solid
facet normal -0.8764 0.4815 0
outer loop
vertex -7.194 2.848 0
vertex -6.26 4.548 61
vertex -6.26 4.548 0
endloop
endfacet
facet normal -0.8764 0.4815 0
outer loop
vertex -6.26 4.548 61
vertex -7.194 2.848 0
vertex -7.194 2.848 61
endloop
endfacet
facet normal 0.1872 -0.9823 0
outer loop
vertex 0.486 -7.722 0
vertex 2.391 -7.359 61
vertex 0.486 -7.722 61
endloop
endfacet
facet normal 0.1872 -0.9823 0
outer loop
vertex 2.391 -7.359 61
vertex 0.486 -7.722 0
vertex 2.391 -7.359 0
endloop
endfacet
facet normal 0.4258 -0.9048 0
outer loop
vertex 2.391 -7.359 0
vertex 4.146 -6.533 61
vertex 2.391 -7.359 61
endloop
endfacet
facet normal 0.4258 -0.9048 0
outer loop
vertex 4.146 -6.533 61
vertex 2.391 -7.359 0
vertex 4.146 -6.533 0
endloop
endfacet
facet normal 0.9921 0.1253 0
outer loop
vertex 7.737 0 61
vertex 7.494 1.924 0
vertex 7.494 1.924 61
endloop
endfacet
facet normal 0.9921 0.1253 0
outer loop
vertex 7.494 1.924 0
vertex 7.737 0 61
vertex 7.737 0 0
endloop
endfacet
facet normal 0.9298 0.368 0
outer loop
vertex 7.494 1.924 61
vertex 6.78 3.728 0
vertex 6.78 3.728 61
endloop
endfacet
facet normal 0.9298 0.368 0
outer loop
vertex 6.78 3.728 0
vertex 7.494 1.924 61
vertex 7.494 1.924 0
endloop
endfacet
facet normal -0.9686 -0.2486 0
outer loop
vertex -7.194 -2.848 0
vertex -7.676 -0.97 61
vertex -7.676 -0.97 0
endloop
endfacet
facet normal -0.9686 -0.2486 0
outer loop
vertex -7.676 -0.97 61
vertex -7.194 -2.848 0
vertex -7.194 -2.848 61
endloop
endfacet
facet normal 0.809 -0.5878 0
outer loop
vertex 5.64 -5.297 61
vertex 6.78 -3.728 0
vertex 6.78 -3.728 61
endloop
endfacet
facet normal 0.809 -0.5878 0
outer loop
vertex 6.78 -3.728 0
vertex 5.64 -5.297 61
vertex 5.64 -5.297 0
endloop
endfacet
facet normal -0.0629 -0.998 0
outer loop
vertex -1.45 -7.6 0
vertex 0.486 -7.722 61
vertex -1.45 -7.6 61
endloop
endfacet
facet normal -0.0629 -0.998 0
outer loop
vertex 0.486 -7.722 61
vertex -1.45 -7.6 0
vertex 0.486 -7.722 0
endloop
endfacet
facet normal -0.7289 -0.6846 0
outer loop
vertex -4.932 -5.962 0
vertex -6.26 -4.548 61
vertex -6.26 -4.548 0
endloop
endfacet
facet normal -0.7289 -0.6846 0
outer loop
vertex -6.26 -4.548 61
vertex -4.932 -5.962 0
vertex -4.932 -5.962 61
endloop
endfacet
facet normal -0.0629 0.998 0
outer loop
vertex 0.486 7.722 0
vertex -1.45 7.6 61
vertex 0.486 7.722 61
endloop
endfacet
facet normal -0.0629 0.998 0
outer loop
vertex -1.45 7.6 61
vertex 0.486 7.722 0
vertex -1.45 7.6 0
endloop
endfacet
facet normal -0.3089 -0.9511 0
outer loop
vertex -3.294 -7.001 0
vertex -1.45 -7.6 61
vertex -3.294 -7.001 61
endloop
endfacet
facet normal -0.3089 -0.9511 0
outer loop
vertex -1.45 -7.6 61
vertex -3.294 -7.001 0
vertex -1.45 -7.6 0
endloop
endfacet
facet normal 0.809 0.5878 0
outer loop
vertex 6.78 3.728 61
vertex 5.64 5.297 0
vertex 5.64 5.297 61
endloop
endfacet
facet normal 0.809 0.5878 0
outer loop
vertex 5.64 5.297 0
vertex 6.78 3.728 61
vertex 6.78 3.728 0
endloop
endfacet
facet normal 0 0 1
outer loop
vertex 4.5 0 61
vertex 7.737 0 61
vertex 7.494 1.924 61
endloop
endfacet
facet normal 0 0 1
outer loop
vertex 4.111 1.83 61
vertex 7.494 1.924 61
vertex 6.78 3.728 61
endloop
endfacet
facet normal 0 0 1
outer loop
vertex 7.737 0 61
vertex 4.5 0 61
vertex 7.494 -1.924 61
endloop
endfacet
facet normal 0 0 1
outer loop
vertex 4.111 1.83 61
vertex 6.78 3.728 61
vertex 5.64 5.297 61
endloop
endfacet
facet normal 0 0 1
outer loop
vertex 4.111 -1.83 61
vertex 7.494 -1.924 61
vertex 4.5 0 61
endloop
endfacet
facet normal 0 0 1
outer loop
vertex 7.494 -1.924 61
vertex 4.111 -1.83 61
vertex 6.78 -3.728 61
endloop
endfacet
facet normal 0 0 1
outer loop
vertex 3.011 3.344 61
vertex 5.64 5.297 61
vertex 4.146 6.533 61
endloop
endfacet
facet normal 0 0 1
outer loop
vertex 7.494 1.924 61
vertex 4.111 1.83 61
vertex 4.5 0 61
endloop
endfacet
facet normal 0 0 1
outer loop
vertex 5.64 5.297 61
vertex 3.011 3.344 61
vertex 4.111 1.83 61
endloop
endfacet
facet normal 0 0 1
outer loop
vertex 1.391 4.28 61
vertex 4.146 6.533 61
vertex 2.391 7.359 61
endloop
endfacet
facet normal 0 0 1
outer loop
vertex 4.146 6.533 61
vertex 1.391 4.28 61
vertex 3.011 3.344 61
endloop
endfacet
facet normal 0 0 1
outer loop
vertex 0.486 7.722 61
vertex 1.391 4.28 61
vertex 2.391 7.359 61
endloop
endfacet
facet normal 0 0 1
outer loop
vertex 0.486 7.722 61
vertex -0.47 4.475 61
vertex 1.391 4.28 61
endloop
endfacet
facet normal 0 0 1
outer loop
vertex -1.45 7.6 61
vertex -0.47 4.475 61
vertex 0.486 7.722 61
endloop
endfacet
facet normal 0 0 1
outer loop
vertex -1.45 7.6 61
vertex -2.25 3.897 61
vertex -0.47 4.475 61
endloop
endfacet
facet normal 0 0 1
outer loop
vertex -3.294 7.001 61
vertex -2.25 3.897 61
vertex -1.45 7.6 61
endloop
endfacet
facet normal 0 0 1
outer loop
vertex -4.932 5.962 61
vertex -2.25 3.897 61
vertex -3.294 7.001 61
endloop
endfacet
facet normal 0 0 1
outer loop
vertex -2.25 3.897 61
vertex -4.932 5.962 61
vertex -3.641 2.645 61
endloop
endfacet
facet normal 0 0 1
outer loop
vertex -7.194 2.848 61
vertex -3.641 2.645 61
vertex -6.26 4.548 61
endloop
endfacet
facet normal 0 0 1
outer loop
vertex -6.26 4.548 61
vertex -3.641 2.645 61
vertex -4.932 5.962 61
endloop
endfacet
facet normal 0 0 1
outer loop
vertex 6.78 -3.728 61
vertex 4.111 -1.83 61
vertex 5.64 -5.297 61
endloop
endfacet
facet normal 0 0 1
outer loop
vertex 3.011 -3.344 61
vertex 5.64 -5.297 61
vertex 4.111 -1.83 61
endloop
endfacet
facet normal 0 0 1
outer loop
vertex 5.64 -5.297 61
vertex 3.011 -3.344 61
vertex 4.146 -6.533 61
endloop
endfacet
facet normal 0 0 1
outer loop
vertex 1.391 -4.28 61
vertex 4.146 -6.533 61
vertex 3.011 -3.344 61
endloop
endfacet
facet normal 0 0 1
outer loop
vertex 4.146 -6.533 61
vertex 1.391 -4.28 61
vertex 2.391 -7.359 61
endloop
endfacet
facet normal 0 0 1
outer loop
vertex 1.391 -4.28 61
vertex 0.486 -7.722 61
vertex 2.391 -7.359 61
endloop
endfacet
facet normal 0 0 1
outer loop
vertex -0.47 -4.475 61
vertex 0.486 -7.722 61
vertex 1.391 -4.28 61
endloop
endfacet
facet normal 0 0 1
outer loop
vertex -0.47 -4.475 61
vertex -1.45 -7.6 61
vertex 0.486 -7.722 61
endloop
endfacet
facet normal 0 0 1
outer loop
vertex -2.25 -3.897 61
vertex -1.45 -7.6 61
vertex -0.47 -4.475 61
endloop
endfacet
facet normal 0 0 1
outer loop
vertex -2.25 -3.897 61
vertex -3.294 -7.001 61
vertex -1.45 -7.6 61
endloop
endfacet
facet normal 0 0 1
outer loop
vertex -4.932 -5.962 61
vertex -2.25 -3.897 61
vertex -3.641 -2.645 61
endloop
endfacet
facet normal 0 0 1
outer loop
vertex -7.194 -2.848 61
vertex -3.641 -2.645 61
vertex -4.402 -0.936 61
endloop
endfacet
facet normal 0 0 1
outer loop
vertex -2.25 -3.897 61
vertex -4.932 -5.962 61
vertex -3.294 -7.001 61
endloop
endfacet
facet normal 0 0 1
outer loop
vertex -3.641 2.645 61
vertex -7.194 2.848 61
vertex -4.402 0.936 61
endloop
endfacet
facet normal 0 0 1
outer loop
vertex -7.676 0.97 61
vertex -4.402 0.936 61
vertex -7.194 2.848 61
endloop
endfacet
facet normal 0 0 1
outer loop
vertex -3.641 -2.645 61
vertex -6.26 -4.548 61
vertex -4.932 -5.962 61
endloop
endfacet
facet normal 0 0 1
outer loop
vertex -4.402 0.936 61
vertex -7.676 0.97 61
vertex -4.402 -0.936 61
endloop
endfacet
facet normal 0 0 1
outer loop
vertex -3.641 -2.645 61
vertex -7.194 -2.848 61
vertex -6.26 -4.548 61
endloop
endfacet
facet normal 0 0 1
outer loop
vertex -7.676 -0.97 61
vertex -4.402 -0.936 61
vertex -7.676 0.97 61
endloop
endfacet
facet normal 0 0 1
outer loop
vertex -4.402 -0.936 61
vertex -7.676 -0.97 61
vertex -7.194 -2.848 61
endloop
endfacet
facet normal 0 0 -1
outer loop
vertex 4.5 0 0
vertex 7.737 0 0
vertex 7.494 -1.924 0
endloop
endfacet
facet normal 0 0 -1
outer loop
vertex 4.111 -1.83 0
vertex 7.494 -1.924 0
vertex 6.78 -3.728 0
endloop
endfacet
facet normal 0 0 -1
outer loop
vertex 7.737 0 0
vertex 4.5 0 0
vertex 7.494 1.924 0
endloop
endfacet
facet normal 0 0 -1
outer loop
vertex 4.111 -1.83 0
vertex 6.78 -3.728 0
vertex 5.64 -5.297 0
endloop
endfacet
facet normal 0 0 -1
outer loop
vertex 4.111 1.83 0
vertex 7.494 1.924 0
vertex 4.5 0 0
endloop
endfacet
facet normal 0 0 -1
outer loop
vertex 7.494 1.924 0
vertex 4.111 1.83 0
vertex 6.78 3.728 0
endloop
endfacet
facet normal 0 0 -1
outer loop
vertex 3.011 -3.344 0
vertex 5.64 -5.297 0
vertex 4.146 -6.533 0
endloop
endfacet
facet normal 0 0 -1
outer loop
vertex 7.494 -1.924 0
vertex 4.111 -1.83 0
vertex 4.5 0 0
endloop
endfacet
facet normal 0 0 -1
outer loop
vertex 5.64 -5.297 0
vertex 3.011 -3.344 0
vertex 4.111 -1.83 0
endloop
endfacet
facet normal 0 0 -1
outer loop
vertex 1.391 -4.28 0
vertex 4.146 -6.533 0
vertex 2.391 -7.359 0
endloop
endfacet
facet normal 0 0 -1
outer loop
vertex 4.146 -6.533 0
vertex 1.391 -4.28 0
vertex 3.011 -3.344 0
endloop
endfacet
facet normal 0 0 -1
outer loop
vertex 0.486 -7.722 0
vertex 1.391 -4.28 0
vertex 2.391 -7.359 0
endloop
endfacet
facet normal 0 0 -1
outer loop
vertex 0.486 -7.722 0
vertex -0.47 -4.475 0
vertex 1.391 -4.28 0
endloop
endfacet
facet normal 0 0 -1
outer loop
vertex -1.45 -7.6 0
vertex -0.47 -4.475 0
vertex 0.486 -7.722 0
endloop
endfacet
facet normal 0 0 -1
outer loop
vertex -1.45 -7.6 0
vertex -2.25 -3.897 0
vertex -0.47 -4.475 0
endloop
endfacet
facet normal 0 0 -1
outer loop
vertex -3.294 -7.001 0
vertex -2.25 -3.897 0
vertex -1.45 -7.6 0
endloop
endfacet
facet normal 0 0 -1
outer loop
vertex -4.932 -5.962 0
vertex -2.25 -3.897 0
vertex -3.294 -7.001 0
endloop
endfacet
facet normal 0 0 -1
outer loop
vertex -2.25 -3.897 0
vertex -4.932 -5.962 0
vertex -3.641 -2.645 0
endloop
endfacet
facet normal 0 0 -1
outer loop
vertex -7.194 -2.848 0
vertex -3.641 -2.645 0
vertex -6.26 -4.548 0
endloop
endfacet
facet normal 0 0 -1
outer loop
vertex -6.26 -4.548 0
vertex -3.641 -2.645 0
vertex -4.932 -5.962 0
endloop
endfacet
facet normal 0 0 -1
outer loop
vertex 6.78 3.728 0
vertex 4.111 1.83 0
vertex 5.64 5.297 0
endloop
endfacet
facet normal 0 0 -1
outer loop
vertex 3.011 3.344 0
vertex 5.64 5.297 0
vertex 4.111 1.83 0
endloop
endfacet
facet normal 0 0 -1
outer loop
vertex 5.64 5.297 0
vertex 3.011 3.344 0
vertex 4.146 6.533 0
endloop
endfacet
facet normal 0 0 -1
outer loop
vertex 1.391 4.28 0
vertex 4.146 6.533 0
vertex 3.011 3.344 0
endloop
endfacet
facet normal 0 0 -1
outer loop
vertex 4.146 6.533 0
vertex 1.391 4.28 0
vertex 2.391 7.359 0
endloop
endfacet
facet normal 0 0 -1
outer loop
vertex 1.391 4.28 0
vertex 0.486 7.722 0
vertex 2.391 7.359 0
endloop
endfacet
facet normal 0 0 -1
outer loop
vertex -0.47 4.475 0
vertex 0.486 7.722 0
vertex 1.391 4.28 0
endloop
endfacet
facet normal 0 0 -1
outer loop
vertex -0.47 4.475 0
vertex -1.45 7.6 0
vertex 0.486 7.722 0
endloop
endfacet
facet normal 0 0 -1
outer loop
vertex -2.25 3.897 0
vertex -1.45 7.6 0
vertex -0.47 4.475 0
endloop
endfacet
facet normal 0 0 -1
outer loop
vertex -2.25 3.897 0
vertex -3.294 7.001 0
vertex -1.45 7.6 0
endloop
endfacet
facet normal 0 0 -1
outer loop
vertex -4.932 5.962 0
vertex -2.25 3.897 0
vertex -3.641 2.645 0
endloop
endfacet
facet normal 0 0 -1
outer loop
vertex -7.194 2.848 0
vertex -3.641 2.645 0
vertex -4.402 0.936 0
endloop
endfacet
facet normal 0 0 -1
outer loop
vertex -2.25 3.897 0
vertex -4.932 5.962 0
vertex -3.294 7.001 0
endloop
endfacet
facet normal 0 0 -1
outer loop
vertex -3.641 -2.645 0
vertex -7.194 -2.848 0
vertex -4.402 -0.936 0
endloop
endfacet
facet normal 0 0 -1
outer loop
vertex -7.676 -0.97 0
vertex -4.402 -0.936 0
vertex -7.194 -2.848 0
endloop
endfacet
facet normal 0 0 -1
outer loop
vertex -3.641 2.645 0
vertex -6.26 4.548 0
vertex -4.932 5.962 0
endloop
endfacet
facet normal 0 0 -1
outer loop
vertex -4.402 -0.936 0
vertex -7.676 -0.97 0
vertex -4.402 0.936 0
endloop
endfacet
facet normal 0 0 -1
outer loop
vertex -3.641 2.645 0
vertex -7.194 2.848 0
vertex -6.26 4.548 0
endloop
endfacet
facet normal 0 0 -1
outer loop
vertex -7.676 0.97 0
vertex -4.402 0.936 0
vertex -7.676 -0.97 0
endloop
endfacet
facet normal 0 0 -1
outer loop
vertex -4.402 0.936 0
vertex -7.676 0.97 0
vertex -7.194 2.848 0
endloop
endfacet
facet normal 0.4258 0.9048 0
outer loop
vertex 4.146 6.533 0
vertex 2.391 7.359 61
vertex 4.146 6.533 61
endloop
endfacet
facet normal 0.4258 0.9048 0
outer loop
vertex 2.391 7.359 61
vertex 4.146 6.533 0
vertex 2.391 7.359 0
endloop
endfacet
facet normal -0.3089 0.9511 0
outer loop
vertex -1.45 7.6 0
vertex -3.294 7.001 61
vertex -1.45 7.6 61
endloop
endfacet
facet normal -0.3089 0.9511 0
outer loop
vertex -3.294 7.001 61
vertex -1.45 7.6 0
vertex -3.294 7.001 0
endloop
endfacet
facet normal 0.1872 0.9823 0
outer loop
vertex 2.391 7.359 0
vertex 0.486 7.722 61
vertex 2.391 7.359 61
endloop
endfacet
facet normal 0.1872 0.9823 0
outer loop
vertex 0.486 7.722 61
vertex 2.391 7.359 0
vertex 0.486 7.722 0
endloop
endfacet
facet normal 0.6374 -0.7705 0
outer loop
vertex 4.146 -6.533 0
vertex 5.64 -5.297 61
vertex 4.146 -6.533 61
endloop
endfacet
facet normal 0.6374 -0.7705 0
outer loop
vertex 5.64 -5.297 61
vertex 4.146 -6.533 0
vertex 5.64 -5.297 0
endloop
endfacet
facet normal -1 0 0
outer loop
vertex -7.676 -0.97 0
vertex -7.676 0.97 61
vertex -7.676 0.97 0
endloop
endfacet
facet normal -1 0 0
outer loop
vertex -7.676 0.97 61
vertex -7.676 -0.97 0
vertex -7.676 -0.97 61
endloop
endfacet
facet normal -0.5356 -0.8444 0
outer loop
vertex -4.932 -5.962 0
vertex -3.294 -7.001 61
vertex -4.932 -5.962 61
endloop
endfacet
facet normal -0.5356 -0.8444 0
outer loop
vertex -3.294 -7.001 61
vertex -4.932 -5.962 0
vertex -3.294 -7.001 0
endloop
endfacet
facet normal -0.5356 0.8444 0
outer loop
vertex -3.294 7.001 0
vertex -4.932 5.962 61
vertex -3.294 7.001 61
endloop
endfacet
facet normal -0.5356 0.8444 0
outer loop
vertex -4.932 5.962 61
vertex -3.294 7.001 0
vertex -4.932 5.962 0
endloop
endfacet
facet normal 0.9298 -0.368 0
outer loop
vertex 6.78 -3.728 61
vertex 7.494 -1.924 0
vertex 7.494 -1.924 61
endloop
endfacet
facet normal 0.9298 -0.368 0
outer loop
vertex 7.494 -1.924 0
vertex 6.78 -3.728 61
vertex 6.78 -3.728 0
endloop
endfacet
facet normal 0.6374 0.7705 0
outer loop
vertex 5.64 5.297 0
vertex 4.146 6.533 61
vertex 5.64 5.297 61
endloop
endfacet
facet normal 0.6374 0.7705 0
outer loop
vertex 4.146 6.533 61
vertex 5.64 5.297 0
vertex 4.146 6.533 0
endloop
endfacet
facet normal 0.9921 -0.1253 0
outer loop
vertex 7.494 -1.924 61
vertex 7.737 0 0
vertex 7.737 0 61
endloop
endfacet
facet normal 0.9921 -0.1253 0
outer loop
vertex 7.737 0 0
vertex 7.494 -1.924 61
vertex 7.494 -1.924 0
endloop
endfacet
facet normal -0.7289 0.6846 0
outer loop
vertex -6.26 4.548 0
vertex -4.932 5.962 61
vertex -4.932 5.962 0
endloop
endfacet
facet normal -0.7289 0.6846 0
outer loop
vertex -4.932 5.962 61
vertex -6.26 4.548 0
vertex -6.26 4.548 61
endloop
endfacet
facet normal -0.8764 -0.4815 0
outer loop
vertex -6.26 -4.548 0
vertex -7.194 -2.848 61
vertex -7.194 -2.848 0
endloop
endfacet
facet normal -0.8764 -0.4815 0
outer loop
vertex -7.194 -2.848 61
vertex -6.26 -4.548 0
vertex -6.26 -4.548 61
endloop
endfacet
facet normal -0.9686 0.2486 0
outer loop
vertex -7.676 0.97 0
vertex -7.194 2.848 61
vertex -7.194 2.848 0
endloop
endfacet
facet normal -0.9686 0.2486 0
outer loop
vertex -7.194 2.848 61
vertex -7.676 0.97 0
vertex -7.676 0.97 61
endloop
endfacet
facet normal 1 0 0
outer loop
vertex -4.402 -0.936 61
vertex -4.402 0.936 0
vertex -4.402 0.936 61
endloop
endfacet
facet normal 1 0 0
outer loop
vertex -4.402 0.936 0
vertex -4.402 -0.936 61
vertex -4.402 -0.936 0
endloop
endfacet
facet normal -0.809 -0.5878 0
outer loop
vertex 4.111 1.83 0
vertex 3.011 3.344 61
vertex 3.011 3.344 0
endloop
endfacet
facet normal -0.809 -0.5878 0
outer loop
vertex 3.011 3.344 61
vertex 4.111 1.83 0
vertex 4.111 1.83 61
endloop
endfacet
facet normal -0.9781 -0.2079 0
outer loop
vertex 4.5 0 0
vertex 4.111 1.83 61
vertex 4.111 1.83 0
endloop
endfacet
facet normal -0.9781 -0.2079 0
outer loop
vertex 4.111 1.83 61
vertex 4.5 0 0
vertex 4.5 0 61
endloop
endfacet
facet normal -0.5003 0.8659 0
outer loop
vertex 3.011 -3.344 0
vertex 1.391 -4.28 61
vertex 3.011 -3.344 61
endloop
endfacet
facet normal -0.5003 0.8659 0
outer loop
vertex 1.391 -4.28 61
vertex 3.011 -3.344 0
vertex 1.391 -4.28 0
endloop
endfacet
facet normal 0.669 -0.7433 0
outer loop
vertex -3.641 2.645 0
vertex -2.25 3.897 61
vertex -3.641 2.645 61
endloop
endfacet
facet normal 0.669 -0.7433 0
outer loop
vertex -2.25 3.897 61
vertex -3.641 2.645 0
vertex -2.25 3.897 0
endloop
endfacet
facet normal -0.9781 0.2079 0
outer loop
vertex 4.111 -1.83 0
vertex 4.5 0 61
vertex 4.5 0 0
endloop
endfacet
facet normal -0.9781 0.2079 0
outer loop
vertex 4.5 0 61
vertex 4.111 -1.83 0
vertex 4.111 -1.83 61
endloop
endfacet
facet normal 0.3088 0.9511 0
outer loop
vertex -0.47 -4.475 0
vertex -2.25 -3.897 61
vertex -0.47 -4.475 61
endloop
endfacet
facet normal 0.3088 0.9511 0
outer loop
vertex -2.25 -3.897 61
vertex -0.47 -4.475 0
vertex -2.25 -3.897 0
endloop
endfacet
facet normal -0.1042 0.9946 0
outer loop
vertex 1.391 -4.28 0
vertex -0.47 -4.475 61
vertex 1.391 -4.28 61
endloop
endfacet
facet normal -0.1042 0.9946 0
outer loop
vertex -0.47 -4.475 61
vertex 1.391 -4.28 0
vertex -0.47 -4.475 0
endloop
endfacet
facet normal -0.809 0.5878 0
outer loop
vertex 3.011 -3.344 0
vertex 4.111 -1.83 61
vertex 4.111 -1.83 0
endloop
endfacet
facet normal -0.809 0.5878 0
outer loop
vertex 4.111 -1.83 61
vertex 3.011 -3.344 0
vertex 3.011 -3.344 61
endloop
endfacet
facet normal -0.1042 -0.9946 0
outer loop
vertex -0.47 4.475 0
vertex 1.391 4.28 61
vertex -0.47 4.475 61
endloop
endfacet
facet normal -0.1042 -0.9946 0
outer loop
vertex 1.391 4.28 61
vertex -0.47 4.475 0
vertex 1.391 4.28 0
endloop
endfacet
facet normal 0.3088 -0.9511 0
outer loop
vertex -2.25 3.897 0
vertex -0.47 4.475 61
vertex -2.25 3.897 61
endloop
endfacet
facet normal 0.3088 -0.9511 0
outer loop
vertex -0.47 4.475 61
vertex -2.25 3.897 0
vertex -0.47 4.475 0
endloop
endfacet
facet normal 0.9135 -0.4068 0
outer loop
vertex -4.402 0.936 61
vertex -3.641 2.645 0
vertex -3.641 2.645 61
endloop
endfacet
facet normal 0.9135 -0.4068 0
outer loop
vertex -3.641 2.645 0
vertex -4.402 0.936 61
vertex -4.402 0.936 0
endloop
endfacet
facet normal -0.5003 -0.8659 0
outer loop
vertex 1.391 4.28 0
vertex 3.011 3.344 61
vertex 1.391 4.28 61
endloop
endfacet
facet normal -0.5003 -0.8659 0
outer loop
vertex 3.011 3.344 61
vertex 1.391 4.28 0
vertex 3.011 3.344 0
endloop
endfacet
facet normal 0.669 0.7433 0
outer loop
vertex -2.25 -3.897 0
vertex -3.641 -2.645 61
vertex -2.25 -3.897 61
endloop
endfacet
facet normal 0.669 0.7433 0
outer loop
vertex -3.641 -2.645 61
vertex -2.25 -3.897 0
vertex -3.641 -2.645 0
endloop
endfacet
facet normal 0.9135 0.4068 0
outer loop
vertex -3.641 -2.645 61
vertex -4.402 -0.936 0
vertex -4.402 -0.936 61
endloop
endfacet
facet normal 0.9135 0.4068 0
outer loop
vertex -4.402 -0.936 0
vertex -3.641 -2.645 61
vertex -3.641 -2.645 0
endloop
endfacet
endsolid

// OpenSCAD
/*
 * @name Replimat Bushing
 * @author Timothy Schmidt
 * @date 2019
 * @url http://www.github.com/replimat-cad
 * @license http://www.gnu.org/licenses/agpl-3.0.en.html
 * @license https://www.tapr.org/TAPR_Open_Hardware_License_v1.0.txt
 */

include <MCAD/units.scad>

difference(){
cylinder(d=5/8*inch - 0.4, h=61);
cylinder(d=9, h=61);
}
